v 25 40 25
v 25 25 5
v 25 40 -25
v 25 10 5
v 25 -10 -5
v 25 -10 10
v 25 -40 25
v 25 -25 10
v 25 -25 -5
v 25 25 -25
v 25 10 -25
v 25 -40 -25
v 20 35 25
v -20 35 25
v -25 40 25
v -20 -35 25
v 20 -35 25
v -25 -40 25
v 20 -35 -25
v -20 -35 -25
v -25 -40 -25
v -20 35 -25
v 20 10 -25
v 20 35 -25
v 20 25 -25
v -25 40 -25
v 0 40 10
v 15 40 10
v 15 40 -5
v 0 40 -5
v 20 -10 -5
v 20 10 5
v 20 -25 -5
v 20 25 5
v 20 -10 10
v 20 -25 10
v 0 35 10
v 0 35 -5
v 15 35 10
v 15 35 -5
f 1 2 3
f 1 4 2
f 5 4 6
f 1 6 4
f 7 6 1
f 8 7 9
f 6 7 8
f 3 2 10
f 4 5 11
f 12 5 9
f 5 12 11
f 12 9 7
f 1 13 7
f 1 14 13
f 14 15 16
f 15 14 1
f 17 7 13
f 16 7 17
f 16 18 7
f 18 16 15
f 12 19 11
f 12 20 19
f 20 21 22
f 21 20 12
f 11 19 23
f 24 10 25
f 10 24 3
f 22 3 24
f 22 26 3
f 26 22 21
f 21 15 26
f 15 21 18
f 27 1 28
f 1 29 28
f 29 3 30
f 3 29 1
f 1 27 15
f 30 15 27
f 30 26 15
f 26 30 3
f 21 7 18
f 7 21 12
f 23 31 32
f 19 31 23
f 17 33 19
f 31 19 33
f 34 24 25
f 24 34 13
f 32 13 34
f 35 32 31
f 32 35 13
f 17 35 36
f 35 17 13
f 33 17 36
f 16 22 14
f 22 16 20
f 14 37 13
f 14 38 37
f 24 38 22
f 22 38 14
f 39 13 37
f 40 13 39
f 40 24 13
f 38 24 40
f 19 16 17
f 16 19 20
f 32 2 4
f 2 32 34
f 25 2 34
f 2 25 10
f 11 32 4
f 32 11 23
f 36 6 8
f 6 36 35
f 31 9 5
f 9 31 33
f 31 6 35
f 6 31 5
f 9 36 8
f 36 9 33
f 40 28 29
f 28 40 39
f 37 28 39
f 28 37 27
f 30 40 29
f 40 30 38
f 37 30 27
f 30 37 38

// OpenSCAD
house();

module house()
{
    base();
    roof();
}

module base()
{
    difference()
    {
        walls();   
        door();
        windows();
    }
}

module walls()
{
    difference()
    {
        cube([50,80,50], true);
        cube([40,70,55], true);
        translate([20,10,-25]) cube([10,15,30]); // Door
        translate([20,-25,-5]) cube([10,15,15]); // Front window
        translate([0,30,-5]) cube([15,10,15]);   // Left window
    }
}

module windows()
{
}

module door()
{
    
}
module roof()
{
    //translate([0,0,50])rotate([0,-90,0])cylinder(60,50,50,$fn=3, true);
}
